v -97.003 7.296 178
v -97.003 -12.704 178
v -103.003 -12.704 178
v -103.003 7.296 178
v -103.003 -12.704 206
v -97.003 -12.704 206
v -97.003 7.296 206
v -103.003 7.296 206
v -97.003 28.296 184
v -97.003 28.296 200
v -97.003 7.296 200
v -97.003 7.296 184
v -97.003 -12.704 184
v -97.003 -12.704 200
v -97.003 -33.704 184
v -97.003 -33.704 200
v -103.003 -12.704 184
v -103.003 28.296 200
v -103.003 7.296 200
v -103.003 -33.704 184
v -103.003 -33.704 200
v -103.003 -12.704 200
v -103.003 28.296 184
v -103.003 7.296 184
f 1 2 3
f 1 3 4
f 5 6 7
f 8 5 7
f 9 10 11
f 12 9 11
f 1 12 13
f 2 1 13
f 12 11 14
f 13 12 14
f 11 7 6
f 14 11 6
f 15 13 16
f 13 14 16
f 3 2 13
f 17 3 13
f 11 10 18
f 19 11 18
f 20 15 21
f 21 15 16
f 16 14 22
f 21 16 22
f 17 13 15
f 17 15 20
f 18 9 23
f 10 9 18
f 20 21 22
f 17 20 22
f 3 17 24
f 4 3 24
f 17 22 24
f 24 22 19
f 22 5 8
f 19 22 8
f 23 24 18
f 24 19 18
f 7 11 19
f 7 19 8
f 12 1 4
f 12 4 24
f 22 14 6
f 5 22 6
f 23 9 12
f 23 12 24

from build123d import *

# Parameters (mm, degrees)
ESQUISSE1_W          = 6
ESQUISSE1_H          = 20
BOSS_EXTRU_2_DEPTH   = 6
ESQUISSE1_W_2        = 16
ESQUISSE1_H_2        = 6
BOSS_EXTRU_2_2_DEPTH = 6
BOSS_EXTRU_2_3_DEPTH = 6
BOSS_EXTRU_2_4_DEPTH = 6
BOSS_EXTRU_3_DEPTH   = 16


with BuildPart() as part:
    # Esquisse1 → Boss.-Extru.2 (new body)
    with BuildSketch(Plane.ZY.offset(97.003078089)):
        with Locations((181.00005, -2.704155421)):
            Rectangle(ESQUISSE1_W, ESQUISSE1_H)
    extrude(amount=BOSS_EXTRU_2_DEPTH)



with BuildPart() as body_2:
    # Esquisse1 → Boss.-Extru.2 2 (new body)
    with BuildSketch(Plane.ZY.offset(97.003078089)):
        with Locations((192.00005, 25.295844579)):
            Rectangle(ESQUISSE1_W_2, ESQUISSE1_H_2)
    extrude(amount=BOSS_EXTRU_2_2_DEPTH)


with BuildPart() as body_3:
    # Esquisse1 → Boss.-Extru.2 3 (new body)
    with BuildSketch(Plane.ZY.offset(97.003078089)):
        with Locations((203.00005, -2.704155421)):
            Rectangle(ESQUISSE1_W, ESQUISSE1_H)
    extrude(amount=BOSS_EXTRU_2_3_DEPTH)


with BuildPart() as body_4:
    # Esquisse1 → Boss.-Extru.2 4 (new body)
    with BuildSketch(Plane.ZY.offset(97.003078089)):
        with Locations((192.00005, -30.704155421)):
            Rectangle(ESQUISSE1_W_2, ESQUISSE1_H_2)
    extrude(amount=BOSS_EXTRU_2_4_DEPTH)


with BuildPart() as part_1:
    add(part.part)

    add(body_2.part)  # Boss.-Extru.3 merges body 2

    add(body_3.part)  # Boss.-Extru.3 merges body 3

    add(body_4.part)  # Boss.-Extru.3 merges body 4
    # Esquisse2 → Boss.-Extru.3 (add)
    with BuildSketch(Plane(origin=(0, 0, 200.00005), x_dir=(-1, 0, 0), z_dir=(0, 0, -1))):
        Polygon((103.003078089, 22.295844579), (97.003078089, 22.295844579), (97.003078089, 7.295844579), (97.003078089, -12.704155421), (97.003078089, -27.704155421), (103.003078089, -27.704155421), (103.003078089, -12.704155421), (103.003078089, 7.295844579), align=None)
    extrude(amount=BOSS_EXTRU_3_DEPTH)


solid = part_1.part
